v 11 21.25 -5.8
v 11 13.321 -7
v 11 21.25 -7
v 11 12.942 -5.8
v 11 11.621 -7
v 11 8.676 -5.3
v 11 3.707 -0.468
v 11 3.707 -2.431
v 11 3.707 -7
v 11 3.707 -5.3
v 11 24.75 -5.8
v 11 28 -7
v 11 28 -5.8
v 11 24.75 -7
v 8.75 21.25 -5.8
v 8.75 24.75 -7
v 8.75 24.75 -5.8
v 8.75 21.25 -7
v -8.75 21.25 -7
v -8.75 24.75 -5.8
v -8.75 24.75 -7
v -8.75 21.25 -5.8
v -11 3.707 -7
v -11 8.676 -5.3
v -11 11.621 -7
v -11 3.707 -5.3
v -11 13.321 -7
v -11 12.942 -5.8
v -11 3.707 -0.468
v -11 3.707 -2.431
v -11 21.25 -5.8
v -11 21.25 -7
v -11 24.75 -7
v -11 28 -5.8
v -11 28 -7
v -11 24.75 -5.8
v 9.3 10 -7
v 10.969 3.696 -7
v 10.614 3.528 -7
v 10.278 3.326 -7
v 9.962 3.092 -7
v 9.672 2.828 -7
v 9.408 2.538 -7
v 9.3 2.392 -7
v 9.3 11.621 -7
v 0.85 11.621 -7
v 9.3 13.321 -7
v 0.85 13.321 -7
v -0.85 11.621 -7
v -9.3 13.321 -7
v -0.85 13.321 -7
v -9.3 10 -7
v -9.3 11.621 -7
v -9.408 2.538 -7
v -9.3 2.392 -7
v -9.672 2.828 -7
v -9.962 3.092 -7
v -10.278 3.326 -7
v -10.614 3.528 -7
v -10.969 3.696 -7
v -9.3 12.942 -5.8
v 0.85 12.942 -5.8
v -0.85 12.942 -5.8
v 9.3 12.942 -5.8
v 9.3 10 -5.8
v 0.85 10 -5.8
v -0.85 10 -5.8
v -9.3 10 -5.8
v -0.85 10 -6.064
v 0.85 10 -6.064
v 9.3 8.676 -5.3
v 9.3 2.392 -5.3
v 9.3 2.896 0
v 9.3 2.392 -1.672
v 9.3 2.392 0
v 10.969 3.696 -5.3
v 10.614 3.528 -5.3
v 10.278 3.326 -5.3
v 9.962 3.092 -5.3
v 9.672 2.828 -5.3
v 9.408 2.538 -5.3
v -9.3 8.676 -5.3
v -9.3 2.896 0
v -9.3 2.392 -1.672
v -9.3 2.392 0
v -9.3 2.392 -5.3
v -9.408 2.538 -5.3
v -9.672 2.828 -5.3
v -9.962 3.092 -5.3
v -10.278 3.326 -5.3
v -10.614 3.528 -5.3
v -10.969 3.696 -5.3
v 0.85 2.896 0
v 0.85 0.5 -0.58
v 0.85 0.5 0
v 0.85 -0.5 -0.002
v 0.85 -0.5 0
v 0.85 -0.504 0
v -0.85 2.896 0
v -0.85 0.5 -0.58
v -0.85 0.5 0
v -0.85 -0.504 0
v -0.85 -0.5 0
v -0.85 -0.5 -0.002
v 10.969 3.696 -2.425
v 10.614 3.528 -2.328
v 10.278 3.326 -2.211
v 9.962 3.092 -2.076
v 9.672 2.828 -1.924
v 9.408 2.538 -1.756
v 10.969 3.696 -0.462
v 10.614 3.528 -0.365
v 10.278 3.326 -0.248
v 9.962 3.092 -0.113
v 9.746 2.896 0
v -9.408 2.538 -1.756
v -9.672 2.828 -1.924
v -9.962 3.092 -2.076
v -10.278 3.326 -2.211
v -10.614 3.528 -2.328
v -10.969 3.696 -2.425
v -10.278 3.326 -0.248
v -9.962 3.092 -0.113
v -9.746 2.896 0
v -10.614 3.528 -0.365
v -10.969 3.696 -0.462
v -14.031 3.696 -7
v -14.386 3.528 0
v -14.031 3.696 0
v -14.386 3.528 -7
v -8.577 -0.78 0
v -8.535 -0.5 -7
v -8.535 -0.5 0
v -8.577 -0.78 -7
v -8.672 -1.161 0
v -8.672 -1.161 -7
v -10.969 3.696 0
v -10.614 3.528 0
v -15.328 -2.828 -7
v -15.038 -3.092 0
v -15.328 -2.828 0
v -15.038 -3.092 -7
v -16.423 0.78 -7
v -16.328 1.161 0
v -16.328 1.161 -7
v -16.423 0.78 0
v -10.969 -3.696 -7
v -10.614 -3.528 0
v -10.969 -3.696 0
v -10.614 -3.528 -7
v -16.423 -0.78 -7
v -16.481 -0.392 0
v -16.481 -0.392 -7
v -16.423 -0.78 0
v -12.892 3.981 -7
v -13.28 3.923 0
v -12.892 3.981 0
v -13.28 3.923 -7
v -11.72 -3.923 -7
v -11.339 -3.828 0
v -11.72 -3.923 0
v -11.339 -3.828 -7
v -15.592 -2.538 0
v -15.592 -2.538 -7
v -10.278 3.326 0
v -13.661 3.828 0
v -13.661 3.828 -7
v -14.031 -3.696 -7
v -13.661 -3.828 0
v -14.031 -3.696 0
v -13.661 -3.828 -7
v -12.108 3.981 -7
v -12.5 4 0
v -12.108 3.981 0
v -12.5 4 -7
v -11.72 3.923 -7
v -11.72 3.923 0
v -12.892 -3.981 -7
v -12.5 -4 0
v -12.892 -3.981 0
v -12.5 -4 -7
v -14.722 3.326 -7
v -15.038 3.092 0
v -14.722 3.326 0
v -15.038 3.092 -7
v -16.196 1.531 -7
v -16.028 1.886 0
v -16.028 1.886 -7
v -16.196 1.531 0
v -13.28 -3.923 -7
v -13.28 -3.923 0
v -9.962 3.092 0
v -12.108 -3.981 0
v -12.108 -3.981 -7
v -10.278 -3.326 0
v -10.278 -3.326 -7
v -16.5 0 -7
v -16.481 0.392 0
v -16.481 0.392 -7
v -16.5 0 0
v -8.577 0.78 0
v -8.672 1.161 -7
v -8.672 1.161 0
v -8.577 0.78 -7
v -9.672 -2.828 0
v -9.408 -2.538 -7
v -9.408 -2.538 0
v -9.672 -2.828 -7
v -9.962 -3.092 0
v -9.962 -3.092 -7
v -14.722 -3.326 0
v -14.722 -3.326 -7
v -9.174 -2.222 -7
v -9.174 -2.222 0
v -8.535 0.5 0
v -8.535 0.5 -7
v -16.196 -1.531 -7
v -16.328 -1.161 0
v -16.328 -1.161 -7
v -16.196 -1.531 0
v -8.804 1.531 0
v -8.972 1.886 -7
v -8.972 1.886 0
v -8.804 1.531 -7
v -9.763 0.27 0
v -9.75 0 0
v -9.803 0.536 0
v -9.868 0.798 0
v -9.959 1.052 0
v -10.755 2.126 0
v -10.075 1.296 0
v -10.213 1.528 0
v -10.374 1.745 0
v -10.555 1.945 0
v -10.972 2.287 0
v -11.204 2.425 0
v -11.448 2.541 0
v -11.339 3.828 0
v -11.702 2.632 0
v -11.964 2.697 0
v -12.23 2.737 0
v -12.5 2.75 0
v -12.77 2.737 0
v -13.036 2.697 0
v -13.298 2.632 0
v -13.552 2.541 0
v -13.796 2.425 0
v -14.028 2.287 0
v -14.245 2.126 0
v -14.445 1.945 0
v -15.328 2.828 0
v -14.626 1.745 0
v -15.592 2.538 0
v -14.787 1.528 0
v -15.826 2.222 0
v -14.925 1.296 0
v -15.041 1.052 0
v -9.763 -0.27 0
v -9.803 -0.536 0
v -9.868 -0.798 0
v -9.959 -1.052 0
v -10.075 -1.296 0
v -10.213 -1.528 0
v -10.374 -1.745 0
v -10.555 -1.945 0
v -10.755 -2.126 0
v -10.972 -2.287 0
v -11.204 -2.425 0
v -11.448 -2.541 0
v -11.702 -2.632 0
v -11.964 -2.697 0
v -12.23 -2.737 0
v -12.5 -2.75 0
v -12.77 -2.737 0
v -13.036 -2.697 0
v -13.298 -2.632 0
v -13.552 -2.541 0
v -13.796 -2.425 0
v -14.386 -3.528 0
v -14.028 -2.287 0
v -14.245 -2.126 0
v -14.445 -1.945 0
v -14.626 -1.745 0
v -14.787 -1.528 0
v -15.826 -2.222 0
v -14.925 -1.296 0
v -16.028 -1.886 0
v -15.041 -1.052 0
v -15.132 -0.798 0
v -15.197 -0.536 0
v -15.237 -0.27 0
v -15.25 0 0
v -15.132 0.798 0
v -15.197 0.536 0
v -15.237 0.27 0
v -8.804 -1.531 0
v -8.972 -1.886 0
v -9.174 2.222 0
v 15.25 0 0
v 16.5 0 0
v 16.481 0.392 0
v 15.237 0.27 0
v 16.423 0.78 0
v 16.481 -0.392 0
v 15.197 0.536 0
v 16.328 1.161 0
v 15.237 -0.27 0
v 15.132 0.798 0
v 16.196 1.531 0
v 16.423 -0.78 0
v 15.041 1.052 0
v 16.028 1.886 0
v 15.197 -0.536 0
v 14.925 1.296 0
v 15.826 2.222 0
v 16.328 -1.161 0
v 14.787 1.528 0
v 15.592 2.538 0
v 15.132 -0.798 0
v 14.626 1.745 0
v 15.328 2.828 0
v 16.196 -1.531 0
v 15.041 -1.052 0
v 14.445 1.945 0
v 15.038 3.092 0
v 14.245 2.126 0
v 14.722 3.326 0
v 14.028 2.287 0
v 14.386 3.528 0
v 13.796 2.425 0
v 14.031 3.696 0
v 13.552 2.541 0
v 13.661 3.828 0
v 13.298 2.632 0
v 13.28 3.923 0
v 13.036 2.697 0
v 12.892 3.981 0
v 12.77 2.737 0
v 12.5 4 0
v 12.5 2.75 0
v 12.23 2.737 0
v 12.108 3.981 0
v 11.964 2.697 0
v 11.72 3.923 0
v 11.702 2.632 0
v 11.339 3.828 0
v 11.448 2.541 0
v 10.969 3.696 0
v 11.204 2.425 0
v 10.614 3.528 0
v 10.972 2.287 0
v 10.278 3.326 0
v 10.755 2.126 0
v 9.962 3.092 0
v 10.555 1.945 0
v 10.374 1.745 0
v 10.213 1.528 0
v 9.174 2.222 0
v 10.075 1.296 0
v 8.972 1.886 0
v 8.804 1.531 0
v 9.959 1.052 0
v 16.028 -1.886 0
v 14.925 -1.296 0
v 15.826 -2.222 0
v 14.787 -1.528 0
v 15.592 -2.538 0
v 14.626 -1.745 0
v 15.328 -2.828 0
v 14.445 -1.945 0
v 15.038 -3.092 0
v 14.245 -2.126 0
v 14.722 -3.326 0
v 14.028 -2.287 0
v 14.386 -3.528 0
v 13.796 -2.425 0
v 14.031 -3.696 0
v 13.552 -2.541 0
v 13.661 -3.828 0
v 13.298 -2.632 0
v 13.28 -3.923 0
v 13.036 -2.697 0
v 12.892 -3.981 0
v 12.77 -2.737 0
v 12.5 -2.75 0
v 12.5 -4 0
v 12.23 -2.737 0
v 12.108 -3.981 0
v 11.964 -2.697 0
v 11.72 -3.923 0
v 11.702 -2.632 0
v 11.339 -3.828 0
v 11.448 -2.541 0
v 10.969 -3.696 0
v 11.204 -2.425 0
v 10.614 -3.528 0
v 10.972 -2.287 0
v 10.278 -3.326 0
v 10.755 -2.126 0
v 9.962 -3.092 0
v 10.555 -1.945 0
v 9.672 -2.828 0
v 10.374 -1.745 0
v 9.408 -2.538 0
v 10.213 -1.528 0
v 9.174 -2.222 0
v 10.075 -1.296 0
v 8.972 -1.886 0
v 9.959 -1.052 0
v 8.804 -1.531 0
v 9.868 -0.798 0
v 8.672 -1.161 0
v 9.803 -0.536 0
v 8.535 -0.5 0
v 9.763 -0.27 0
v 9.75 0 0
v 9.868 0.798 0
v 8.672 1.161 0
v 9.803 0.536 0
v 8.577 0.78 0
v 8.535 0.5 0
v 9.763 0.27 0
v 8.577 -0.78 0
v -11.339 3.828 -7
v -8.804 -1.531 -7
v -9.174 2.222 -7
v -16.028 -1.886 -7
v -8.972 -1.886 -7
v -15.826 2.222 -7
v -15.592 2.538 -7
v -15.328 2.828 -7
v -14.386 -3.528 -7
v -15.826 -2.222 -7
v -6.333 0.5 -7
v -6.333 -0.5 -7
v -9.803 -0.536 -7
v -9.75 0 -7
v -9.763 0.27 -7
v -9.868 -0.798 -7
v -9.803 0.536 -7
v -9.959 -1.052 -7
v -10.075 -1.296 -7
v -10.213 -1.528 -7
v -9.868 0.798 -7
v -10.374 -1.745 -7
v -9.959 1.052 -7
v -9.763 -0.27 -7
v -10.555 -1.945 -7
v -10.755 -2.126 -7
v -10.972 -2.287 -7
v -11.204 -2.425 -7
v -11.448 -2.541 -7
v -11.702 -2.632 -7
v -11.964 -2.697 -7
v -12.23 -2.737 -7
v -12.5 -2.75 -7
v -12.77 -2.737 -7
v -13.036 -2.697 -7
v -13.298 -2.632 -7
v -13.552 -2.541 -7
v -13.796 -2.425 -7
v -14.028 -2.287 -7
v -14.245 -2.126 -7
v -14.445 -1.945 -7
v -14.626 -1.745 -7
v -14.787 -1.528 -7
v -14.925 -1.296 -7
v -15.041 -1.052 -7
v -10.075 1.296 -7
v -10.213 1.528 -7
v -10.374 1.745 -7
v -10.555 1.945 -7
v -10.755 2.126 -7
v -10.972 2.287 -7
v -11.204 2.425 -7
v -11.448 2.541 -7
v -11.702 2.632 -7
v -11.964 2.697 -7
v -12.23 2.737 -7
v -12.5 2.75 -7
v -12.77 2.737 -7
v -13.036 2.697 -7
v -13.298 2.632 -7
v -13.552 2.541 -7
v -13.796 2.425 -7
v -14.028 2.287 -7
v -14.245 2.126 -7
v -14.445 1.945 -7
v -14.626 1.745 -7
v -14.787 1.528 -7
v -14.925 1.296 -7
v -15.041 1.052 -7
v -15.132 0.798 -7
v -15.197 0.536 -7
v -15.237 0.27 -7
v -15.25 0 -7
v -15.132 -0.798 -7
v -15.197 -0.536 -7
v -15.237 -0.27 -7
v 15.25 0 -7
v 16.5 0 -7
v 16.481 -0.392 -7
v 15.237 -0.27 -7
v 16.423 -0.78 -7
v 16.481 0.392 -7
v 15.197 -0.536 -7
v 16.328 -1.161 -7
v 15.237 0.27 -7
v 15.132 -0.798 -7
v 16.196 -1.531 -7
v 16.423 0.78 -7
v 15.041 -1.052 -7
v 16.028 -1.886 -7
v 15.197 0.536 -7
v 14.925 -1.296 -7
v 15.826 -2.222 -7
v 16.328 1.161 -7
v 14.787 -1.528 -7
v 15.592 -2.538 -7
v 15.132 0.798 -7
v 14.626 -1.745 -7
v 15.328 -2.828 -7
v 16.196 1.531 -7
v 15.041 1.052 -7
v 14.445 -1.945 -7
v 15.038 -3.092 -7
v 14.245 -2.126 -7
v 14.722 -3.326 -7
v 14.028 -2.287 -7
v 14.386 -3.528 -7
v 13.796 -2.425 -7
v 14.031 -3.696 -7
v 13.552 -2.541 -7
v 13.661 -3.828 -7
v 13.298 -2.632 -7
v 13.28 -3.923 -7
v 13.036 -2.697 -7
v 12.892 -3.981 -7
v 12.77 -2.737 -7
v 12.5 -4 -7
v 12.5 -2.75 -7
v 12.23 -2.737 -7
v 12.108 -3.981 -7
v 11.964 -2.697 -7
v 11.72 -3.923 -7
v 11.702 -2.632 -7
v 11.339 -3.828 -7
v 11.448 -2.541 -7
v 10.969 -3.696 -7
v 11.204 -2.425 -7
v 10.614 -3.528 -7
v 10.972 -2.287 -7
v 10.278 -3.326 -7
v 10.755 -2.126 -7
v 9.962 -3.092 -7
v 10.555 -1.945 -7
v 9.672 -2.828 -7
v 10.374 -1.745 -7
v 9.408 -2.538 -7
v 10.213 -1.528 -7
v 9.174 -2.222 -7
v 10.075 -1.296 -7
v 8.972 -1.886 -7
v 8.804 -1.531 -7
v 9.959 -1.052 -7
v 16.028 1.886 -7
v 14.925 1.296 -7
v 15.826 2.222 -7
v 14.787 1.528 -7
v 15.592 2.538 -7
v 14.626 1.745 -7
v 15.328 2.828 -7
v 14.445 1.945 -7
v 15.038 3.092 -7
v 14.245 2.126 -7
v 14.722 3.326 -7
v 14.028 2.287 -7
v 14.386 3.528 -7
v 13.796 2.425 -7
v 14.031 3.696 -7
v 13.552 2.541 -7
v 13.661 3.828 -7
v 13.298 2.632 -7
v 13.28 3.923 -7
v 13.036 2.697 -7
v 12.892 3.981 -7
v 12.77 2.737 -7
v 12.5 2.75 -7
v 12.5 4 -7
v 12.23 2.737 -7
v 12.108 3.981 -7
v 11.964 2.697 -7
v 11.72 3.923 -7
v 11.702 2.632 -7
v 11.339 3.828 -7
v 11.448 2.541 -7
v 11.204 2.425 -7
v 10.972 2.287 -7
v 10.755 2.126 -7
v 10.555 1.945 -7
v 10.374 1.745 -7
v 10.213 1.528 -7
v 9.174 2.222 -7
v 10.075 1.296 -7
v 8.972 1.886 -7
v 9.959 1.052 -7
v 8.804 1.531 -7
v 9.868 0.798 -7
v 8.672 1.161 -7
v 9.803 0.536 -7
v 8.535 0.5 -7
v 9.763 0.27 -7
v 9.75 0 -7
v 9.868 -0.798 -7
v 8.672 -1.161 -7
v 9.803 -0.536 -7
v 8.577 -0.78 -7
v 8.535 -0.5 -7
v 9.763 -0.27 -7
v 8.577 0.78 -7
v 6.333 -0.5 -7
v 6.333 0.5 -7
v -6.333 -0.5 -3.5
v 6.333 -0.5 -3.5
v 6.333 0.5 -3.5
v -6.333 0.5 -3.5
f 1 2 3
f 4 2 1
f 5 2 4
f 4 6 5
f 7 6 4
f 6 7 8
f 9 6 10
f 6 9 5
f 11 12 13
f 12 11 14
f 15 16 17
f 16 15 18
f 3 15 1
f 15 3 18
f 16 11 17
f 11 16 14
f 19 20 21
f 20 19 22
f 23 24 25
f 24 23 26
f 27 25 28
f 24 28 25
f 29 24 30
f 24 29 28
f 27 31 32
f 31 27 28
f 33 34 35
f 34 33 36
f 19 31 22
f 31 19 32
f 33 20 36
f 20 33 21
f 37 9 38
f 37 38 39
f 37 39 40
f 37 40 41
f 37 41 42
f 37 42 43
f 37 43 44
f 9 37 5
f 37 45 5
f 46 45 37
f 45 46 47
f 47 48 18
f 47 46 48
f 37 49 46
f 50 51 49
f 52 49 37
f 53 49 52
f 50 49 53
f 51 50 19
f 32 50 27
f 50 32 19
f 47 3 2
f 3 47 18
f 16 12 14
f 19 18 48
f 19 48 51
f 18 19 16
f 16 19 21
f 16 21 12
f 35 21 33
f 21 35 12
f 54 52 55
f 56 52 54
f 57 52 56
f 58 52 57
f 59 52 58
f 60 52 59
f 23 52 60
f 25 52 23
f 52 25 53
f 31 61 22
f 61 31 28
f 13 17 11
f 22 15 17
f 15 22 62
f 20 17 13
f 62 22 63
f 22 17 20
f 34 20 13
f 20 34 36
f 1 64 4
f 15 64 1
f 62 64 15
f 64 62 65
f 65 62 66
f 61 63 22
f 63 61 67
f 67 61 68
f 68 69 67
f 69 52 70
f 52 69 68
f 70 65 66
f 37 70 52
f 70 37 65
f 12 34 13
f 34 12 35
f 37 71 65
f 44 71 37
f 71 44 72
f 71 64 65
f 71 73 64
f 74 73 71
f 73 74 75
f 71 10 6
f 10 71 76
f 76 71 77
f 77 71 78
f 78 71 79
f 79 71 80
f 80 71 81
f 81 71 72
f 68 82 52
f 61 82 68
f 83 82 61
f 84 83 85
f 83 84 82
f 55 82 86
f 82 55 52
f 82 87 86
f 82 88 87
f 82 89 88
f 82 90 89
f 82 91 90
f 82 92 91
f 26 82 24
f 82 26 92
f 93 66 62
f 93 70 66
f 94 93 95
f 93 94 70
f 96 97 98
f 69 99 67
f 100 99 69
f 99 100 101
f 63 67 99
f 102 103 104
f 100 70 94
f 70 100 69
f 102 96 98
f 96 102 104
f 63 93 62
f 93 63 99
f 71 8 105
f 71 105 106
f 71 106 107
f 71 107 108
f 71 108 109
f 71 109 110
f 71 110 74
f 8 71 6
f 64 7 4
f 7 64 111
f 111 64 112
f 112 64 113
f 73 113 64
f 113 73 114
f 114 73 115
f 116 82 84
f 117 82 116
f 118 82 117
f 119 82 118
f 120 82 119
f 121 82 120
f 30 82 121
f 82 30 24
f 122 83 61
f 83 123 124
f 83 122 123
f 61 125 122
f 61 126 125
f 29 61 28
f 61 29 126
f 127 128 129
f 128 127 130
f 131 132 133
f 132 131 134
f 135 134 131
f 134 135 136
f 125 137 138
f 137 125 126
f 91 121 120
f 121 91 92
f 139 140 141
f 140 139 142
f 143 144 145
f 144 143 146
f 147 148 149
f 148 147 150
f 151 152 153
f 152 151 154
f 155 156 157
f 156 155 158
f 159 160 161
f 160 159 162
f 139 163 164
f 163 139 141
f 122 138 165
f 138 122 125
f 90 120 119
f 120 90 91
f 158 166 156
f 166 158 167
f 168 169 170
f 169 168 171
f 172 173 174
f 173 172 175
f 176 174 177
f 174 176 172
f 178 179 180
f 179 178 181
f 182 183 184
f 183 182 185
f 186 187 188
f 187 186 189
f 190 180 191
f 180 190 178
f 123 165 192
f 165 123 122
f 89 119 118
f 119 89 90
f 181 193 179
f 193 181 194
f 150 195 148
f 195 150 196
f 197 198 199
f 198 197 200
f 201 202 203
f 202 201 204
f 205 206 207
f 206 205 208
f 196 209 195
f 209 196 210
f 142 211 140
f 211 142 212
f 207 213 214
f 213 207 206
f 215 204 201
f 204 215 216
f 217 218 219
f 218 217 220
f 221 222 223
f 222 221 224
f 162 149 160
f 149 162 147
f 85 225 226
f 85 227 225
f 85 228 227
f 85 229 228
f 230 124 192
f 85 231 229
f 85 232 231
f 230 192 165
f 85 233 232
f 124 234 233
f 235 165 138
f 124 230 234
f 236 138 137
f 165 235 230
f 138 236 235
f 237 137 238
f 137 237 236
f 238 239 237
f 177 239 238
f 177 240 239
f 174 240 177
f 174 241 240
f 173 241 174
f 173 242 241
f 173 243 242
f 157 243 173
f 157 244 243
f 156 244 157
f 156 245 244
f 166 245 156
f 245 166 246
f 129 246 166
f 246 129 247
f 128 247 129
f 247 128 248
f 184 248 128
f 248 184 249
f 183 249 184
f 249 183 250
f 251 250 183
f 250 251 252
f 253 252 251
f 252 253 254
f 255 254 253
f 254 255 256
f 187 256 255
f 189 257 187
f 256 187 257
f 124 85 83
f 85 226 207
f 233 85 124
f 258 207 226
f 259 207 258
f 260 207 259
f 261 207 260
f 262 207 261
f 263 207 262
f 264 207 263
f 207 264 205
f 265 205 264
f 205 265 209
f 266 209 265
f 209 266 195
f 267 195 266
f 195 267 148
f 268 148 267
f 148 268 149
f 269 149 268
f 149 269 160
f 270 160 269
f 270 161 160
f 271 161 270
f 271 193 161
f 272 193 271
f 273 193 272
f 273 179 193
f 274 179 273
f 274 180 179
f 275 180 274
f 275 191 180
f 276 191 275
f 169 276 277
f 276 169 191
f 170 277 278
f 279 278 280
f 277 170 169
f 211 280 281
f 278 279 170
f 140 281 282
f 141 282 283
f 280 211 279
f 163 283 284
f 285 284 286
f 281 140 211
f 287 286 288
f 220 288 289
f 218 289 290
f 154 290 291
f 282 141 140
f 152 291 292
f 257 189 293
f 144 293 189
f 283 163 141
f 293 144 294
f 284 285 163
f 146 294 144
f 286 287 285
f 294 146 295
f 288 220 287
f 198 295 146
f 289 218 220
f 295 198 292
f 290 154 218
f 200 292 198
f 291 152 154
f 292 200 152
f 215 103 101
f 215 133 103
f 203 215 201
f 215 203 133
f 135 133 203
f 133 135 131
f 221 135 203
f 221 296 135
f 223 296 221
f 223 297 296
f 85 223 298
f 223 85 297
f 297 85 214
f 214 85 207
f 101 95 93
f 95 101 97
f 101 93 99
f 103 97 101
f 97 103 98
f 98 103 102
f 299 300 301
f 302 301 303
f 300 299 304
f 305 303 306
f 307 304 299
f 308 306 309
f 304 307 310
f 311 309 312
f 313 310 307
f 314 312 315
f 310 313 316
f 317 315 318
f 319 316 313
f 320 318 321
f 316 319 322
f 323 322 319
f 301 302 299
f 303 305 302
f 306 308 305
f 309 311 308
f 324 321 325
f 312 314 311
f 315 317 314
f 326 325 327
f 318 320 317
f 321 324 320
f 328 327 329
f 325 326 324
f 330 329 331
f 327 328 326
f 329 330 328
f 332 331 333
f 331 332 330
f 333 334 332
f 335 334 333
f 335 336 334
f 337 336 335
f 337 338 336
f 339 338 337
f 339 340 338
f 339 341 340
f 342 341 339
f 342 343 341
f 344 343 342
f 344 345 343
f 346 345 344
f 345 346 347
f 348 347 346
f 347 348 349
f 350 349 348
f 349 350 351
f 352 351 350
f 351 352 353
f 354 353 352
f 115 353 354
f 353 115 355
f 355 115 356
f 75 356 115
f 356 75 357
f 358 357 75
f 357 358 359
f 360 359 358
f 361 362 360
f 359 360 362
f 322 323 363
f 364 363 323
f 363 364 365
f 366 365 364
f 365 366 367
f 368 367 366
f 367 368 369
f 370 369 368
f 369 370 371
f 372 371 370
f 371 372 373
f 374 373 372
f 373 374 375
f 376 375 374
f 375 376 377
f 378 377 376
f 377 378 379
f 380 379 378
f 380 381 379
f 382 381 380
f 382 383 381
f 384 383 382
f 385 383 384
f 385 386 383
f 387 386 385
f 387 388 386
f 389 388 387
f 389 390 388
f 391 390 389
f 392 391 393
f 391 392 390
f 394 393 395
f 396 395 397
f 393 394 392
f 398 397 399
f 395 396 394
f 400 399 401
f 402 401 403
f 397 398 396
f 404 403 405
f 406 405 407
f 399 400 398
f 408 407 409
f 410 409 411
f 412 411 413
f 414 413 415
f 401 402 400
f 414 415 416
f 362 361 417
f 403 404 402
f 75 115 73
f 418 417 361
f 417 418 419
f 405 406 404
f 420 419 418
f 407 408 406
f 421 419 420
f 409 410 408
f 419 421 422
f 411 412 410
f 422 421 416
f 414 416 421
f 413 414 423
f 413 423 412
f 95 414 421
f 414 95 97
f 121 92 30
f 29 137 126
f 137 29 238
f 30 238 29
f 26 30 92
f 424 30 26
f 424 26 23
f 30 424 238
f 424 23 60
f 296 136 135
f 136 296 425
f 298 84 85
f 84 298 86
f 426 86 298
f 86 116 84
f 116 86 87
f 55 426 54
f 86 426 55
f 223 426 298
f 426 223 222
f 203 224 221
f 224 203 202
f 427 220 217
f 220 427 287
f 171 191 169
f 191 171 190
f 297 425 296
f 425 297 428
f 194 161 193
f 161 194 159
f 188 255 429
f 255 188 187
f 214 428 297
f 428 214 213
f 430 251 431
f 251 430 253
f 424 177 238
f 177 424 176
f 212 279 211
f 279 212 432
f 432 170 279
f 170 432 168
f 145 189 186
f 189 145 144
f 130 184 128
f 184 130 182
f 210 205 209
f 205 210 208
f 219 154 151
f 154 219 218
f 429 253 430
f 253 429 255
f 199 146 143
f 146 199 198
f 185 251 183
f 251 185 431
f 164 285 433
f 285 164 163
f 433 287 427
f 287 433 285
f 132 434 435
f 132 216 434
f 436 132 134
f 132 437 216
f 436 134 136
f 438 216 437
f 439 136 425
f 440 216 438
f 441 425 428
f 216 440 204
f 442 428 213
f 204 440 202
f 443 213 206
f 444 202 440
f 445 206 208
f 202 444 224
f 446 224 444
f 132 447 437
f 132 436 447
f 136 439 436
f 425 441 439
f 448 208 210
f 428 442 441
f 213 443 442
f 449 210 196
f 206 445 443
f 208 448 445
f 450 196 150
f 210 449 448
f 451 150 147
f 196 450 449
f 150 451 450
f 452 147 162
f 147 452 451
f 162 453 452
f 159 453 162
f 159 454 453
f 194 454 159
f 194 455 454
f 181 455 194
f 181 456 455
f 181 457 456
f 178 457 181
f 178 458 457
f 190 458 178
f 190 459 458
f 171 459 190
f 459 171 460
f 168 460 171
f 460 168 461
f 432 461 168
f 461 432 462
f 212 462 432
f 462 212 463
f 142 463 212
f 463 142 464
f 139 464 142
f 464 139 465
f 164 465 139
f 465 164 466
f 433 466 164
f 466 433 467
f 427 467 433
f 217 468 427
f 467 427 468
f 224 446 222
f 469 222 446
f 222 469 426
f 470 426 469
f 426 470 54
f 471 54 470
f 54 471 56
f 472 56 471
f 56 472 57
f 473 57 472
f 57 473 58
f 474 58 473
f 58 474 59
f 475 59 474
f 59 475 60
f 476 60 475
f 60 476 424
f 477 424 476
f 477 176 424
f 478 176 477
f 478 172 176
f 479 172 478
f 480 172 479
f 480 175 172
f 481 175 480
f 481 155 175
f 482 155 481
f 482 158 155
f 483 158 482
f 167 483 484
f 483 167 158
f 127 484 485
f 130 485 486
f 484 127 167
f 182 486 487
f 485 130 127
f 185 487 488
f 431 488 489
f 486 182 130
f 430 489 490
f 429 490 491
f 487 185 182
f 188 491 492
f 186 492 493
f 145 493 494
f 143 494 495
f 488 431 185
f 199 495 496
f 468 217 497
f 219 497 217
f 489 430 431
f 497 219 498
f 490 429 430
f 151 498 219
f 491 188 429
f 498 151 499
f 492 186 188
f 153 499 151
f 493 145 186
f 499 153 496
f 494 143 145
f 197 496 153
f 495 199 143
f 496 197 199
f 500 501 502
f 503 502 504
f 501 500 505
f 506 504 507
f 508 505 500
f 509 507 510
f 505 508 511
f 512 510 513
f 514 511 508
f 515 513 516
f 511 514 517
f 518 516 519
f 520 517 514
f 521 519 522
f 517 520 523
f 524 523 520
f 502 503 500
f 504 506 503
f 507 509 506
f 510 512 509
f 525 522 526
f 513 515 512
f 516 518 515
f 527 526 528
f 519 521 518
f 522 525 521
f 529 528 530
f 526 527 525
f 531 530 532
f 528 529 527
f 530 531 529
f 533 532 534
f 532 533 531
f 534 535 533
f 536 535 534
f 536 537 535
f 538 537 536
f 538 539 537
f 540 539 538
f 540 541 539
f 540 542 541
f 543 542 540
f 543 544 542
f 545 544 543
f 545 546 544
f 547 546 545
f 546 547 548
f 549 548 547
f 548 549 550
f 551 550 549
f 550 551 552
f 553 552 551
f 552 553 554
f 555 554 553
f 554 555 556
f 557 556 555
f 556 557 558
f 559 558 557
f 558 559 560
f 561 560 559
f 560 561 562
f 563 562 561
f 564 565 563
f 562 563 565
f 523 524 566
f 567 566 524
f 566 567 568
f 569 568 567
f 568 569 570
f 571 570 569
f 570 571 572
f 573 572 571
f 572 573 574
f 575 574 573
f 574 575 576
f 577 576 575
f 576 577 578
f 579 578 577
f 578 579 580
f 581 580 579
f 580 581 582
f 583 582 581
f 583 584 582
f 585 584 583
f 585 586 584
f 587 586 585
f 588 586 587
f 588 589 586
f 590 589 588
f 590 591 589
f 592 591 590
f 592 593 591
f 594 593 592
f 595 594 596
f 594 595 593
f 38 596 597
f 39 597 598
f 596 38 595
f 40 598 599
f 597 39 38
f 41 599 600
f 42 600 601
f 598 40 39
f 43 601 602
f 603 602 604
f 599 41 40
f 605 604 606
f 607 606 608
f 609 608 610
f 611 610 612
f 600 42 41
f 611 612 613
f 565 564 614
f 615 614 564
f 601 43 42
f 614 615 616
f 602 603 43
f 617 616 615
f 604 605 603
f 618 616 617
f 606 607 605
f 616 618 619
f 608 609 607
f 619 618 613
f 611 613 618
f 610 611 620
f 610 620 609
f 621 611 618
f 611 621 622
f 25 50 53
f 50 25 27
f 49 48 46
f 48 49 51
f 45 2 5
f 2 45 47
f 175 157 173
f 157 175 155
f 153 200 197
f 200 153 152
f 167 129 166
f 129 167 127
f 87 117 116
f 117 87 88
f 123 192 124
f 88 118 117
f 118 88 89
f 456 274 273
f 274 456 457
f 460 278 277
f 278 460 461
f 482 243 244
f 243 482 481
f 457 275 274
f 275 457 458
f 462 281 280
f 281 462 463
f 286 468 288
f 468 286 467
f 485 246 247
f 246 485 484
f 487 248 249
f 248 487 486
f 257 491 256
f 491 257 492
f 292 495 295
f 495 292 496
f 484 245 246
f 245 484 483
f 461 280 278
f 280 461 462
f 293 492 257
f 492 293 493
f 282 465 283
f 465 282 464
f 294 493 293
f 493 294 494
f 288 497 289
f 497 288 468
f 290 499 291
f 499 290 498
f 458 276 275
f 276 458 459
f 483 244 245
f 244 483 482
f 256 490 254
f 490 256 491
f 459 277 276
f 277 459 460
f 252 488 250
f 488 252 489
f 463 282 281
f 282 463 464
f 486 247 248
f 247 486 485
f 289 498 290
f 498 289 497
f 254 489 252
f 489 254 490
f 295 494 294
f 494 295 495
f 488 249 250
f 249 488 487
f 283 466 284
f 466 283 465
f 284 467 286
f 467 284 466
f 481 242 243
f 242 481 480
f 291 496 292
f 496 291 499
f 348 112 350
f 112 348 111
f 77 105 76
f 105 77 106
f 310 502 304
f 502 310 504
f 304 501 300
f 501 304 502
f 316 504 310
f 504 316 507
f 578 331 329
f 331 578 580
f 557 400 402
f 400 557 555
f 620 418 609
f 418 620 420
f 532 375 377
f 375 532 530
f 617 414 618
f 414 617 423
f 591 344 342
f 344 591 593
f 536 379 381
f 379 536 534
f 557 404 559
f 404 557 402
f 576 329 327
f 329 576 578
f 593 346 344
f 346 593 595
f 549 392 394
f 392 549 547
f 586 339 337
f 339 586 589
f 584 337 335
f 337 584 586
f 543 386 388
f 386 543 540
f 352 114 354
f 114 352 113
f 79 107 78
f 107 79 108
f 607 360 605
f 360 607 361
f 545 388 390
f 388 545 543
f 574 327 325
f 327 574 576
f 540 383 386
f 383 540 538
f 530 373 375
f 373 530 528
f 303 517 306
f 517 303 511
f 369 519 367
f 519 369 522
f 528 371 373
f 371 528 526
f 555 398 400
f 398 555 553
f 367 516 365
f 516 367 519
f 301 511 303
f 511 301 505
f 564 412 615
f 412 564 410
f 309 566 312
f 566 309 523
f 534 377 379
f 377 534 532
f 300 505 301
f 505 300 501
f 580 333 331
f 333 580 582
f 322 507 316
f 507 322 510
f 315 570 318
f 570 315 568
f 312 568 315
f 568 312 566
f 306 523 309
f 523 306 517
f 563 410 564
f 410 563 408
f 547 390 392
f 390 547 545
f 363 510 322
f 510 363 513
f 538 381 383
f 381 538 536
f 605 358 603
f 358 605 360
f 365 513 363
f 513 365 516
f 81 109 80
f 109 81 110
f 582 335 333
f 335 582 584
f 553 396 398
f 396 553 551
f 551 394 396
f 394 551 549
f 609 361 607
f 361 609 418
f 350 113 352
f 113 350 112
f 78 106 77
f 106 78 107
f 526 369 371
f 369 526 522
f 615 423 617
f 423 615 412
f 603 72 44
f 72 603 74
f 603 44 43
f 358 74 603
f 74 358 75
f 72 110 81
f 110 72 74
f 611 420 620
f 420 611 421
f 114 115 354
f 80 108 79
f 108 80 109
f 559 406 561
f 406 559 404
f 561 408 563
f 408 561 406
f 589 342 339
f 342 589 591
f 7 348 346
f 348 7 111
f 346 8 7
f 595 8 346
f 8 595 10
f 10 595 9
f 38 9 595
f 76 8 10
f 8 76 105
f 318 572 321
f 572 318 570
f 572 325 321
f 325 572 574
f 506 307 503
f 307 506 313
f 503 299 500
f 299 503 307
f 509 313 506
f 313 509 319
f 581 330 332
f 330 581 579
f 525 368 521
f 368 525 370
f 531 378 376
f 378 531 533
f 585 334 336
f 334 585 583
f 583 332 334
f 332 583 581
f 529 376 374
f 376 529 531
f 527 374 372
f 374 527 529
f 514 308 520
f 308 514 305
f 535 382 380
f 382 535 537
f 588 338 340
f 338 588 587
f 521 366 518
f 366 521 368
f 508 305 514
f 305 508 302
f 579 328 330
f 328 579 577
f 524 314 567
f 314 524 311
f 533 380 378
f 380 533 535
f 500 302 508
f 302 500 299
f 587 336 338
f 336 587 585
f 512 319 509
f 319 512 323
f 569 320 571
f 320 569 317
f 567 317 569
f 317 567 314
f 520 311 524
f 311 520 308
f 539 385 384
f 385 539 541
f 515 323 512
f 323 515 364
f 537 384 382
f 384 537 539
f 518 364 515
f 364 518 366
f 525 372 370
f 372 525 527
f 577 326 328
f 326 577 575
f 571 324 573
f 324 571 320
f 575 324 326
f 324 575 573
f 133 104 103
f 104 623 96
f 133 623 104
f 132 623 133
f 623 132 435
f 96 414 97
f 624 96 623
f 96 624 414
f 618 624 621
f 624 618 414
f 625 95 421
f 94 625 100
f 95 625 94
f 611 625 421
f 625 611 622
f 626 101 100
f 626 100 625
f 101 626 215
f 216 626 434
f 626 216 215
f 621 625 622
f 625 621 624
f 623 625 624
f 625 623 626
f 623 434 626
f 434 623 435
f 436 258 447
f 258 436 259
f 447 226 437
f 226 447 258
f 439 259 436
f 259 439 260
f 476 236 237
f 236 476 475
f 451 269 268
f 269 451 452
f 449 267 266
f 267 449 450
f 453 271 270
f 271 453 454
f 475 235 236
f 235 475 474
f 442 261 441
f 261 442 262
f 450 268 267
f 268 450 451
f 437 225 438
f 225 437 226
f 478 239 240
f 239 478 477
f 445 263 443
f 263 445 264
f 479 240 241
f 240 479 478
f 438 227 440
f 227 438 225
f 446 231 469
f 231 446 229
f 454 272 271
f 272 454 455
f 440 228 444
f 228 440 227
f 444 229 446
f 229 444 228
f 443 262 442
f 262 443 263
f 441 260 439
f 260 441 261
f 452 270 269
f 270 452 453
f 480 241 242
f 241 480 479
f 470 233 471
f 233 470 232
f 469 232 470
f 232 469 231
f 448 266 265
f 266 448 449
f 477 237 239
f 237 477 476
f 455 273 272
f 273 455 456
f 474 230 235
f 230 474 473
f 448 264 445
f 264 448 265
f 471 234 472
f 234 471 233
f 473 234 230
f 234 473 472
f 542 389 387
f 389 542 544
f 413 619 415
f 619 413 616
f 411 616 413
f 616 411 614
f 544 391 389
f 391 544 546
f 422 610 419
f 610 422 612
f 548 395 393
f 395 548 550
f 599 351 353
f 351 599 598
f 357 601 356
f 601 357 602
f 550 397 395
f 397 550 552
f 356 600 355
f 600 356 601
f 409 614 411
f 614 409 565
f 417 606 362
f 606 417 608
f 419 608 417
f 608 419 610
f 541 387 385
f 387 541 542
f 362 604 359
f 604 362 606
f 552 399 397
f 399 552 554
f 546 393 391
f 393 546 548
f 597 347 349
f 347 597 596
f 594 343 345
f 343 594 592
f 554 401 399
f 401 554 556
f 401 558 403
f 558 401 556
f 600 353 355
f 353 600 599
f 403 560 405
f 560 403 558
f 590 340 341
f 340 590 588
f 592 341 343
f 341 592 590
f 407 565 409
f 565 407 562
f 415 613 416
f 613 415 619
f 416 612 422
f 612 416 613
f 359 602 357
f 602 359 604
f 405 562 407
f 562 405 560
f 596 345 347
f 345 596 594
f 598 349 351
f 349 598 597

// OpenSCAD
/* [MOUNT] */
WIDTH = 25.0;
MOUNT_DIAMETER = 5.5;  //4.95
MOUNT_THICKNESS = 2.5;
MOUNT_HEIGHT= 7.00;     // 6.75

/* [BRIDGE] */
BRIDGE_WIDTH = WIDTH - 10;   //8 is not catching up to much
BRIDGE_THICKNESS = 1.5;

/* [VERTICAL_BRIDGE] */
VERTICAL_BRIDGE_WIDTH = WIDTH - 6;  //-6
VERTICAL_BRIDGE_THICKNESS = 1;

VERTICAL_BRIDGE_CUTOUT_WIDTH = VERTICAL_BRIDGE_WIDTH*2/3;
VERTICAL_BRIDGE_CUTOUT_HEIGHT = MOUNT_HEIGHT/2;

/* [SHELF] */
VTX_WIDTH = 17.5;
SHELF_WIDTH = VTX_WIDTH + 4.5 ; 
SHELF_LENGTH = 18;
SHELF_Y_OFFSET = 10;    //10 -> 6
SHELF_THICKNESS = 1.2;

/* [META] */
ZIPTIE_WIDTH = 3.5;

TEST_WIDTH = false;     // [false, true]
CORNERS_DIAMETER = 4;
BOUNDED = true;         // [true, false]
FN = 64;                // [0:32:256]  

/* [HIDDEN] */
$fn = FN;
DEBUG = false;

rotate([180,0,0])
shelf_on_poles();

module shelf_on_poles(){
    if(TEST_WIDTH){
        union(){
            side_mounts(2);       
            vertical_bridge(2);                     
        }
    }    
    else{
        difference(){
            intersection(){
                union(){
                    translate([0,0,MOUNT_HEIGHT])
                    shelf(SHELF_THICKNESS);    
                    
                    side_mounts(MOUNT_HEIGHT);
                    vertical_bridge(MOUNT_HEIGHT);  
                }
            
                if(BOUNDED){
                    bounding_box();
                }            
            }
            side_poles();
              
        }
        
        // Debug objects
//        if(DEBUG){                
//            if(BOUNDED){                
//                bounding_box();
//            }               
//        }        
//        
//        if(DEBUG){
//            side_poles();                         
//        }          
    }
}

module side_mounts(height){
    x_offset = WIDTH/2;
    
    translate([-x_offset,0,0])    
    mount(height);

    translate([x_offset,0,0])
    mount(height);    
}

module mount(height){
    outside_diameter = MOUNT_DIAMETER + MOUNT_THICKNESS;    
    
    difference(){
        //positive
        union(){
            translate([0,0, height/2])
            cylinder(height, outside_diameter/2, outside_diameter/2, true);
        }
        
        //negative
        union(){
            pole();
        }
    }
    
    if(DEBUG){
        color("red", 0.5)
        pole();
    }
}

module side_poles(){
    x_offset = WIDTH/2;
    
    translate([-x_offset,0,0])    
    pole();

    translate([x_offset,0,0])
    pole();       
}

module pole(){
    outside_diameter = MOUNT_DIAMETER + MOUNT_THICKNESS;    
    
    color("red", 0.5)
    translate([0,0, MOUNT_HEIGHT/2])
    cylinder(MOUNT_HEIGHT*2, MOUNT_DIAMETER/2, MOUNT_DIAMETER/2, true);        
}

module vertical_bridge(height){
    difference(){
        translate([0,0, height/2])    
        cube([VERTICAL_BRIDGE_WIDTH, VERTICAL_BRIDGE_THICKNESS, height], true);      
        vertical_bridge_cutout();
    }
    
    if(DEBUG){
        vertical_bridge_cutout();
    }
}

module vertical_bridge_cutout(){
    height = VERTICAL_BRIDGE_CUTOUT_HEIGHT;
    width = VERTICAL_BRIDGE_CUTOUT_WIDTH;
    
    color("red", 0.5)
    translate([0,0, MOUNT_HEIGHT])    
    translate([0,0, -height/2])    
    cube([width, VERTICAL_BRIDGE_THICKNESS*2, height], true);    
}

module shelf(thickness){
    holder_thickness = thickness + 0.5;
    width = SHELF_WIDTH;
    
    translate([0,-SHELF_LENGTH/2-SHELF_Y_OFFSET,-thickness/2])
    difference(){
        cube([width, SHELF_LENGTH, thickness], true);
        translate([0,-4,0])        
        shelf_zipties(width, thickness);    
    }
    
    straight_shelf_holders(width, holder_thickness);
    
    angled_shelf_holders(width, holder_thickness);

}

module shelf_zipties(width, thickness){
    ziptie_cutout = (SHELF_WIDTH - VTX_WIDTH)/2;    
    x_offset = width/2 - ziptie_cutout/2;
    y_offset = 0;    
    
    union(){
        translate([x_offset, 0, 0])
        shelf_ziptie(ziptie_cutout, thickness);
        
        translate([-x_offset, 0, 0])
        shelf_ziptie(ziptie_cutout, thickness);    
    }         
}

module shelf_ziptie(ziptie_cutout, thickness){
    cube([ziptie_cutout, ZIPTIE_WIDTH, thickness*2], true);  
}

module straight_shelf_holders(width, thickness){
    angle = 90;
    length1 = 10;
    x_offset = width/2 - thickness/2;
    y_offset = 2;
    
    translate([0,-y_offset,-thickness/2])
    rotate([angle,0,0])
    union(){
        translate([x_offset, 0, 0])
        shelf_holder(thickness, length1);
        
        translate([-x_offset, 0, 0])
        shelf_holder(thickness, length1);    
    }    
}

module angled_shelf_holders(width, thickness){
    angle = 60;
    length1 = 20;
    z_offset = 0;
    x_offset = width/2 - thickness/2;
    y_offset = 4;     //2.5
    
    translate([0,y_offset,-length1/2+z_offset])
    rotate([angle,0,0])
    union(){
        translate([0, 0, 0])
        shelf_holder(thickness, length1);        
        
        translate([x_offset, 0, 0])
        shelf_holder(thickness, length1);
        
        translate([-x_offset, 0, 0])
        shelf_holder(thickness, length1);    
    }
}

module shelf_holder(thickness, length){
    translate([0,0,length/2])
    cube([thickness, thickness, length], true);       
    
}

module bounding_box(){
    color("green", 0.5)
    translate([0,0,MOUNT_HEIGHT/2])                
    cube([WIDTH*2, WIDTH*3, MOUNT_HEIGHT], true);               
}

module rounded_corners_trapeze(bottom_width, upper_width, height, depth, corner_curve){
    x_translate = bottom_width-corner_curve;
    x_translate2 = upper_width-corner_curve;    
    y_translate = height-corner_curve;
    
    
    hull(){
            translate([-x_translate/2, -y_translate/2, 0])
            cylinder(depth,corner_curve/2, corner_curve/2, true);    
            
            translate([-x_translate2/2, y_translate/2, 0])
            cylinder(depth,corner_curve/2, corner_curve/2, true);

            translate([x_translate2/2, y_translate/2, 0])
            cylinder(depth,corner_curve/2, corner_curve/2, true);        
            
            translate([x_translate/2, -y_translate/2, 0])
            cylinder(depth,corner_curve/2, corner_curve/2, true);        
    }        
}
